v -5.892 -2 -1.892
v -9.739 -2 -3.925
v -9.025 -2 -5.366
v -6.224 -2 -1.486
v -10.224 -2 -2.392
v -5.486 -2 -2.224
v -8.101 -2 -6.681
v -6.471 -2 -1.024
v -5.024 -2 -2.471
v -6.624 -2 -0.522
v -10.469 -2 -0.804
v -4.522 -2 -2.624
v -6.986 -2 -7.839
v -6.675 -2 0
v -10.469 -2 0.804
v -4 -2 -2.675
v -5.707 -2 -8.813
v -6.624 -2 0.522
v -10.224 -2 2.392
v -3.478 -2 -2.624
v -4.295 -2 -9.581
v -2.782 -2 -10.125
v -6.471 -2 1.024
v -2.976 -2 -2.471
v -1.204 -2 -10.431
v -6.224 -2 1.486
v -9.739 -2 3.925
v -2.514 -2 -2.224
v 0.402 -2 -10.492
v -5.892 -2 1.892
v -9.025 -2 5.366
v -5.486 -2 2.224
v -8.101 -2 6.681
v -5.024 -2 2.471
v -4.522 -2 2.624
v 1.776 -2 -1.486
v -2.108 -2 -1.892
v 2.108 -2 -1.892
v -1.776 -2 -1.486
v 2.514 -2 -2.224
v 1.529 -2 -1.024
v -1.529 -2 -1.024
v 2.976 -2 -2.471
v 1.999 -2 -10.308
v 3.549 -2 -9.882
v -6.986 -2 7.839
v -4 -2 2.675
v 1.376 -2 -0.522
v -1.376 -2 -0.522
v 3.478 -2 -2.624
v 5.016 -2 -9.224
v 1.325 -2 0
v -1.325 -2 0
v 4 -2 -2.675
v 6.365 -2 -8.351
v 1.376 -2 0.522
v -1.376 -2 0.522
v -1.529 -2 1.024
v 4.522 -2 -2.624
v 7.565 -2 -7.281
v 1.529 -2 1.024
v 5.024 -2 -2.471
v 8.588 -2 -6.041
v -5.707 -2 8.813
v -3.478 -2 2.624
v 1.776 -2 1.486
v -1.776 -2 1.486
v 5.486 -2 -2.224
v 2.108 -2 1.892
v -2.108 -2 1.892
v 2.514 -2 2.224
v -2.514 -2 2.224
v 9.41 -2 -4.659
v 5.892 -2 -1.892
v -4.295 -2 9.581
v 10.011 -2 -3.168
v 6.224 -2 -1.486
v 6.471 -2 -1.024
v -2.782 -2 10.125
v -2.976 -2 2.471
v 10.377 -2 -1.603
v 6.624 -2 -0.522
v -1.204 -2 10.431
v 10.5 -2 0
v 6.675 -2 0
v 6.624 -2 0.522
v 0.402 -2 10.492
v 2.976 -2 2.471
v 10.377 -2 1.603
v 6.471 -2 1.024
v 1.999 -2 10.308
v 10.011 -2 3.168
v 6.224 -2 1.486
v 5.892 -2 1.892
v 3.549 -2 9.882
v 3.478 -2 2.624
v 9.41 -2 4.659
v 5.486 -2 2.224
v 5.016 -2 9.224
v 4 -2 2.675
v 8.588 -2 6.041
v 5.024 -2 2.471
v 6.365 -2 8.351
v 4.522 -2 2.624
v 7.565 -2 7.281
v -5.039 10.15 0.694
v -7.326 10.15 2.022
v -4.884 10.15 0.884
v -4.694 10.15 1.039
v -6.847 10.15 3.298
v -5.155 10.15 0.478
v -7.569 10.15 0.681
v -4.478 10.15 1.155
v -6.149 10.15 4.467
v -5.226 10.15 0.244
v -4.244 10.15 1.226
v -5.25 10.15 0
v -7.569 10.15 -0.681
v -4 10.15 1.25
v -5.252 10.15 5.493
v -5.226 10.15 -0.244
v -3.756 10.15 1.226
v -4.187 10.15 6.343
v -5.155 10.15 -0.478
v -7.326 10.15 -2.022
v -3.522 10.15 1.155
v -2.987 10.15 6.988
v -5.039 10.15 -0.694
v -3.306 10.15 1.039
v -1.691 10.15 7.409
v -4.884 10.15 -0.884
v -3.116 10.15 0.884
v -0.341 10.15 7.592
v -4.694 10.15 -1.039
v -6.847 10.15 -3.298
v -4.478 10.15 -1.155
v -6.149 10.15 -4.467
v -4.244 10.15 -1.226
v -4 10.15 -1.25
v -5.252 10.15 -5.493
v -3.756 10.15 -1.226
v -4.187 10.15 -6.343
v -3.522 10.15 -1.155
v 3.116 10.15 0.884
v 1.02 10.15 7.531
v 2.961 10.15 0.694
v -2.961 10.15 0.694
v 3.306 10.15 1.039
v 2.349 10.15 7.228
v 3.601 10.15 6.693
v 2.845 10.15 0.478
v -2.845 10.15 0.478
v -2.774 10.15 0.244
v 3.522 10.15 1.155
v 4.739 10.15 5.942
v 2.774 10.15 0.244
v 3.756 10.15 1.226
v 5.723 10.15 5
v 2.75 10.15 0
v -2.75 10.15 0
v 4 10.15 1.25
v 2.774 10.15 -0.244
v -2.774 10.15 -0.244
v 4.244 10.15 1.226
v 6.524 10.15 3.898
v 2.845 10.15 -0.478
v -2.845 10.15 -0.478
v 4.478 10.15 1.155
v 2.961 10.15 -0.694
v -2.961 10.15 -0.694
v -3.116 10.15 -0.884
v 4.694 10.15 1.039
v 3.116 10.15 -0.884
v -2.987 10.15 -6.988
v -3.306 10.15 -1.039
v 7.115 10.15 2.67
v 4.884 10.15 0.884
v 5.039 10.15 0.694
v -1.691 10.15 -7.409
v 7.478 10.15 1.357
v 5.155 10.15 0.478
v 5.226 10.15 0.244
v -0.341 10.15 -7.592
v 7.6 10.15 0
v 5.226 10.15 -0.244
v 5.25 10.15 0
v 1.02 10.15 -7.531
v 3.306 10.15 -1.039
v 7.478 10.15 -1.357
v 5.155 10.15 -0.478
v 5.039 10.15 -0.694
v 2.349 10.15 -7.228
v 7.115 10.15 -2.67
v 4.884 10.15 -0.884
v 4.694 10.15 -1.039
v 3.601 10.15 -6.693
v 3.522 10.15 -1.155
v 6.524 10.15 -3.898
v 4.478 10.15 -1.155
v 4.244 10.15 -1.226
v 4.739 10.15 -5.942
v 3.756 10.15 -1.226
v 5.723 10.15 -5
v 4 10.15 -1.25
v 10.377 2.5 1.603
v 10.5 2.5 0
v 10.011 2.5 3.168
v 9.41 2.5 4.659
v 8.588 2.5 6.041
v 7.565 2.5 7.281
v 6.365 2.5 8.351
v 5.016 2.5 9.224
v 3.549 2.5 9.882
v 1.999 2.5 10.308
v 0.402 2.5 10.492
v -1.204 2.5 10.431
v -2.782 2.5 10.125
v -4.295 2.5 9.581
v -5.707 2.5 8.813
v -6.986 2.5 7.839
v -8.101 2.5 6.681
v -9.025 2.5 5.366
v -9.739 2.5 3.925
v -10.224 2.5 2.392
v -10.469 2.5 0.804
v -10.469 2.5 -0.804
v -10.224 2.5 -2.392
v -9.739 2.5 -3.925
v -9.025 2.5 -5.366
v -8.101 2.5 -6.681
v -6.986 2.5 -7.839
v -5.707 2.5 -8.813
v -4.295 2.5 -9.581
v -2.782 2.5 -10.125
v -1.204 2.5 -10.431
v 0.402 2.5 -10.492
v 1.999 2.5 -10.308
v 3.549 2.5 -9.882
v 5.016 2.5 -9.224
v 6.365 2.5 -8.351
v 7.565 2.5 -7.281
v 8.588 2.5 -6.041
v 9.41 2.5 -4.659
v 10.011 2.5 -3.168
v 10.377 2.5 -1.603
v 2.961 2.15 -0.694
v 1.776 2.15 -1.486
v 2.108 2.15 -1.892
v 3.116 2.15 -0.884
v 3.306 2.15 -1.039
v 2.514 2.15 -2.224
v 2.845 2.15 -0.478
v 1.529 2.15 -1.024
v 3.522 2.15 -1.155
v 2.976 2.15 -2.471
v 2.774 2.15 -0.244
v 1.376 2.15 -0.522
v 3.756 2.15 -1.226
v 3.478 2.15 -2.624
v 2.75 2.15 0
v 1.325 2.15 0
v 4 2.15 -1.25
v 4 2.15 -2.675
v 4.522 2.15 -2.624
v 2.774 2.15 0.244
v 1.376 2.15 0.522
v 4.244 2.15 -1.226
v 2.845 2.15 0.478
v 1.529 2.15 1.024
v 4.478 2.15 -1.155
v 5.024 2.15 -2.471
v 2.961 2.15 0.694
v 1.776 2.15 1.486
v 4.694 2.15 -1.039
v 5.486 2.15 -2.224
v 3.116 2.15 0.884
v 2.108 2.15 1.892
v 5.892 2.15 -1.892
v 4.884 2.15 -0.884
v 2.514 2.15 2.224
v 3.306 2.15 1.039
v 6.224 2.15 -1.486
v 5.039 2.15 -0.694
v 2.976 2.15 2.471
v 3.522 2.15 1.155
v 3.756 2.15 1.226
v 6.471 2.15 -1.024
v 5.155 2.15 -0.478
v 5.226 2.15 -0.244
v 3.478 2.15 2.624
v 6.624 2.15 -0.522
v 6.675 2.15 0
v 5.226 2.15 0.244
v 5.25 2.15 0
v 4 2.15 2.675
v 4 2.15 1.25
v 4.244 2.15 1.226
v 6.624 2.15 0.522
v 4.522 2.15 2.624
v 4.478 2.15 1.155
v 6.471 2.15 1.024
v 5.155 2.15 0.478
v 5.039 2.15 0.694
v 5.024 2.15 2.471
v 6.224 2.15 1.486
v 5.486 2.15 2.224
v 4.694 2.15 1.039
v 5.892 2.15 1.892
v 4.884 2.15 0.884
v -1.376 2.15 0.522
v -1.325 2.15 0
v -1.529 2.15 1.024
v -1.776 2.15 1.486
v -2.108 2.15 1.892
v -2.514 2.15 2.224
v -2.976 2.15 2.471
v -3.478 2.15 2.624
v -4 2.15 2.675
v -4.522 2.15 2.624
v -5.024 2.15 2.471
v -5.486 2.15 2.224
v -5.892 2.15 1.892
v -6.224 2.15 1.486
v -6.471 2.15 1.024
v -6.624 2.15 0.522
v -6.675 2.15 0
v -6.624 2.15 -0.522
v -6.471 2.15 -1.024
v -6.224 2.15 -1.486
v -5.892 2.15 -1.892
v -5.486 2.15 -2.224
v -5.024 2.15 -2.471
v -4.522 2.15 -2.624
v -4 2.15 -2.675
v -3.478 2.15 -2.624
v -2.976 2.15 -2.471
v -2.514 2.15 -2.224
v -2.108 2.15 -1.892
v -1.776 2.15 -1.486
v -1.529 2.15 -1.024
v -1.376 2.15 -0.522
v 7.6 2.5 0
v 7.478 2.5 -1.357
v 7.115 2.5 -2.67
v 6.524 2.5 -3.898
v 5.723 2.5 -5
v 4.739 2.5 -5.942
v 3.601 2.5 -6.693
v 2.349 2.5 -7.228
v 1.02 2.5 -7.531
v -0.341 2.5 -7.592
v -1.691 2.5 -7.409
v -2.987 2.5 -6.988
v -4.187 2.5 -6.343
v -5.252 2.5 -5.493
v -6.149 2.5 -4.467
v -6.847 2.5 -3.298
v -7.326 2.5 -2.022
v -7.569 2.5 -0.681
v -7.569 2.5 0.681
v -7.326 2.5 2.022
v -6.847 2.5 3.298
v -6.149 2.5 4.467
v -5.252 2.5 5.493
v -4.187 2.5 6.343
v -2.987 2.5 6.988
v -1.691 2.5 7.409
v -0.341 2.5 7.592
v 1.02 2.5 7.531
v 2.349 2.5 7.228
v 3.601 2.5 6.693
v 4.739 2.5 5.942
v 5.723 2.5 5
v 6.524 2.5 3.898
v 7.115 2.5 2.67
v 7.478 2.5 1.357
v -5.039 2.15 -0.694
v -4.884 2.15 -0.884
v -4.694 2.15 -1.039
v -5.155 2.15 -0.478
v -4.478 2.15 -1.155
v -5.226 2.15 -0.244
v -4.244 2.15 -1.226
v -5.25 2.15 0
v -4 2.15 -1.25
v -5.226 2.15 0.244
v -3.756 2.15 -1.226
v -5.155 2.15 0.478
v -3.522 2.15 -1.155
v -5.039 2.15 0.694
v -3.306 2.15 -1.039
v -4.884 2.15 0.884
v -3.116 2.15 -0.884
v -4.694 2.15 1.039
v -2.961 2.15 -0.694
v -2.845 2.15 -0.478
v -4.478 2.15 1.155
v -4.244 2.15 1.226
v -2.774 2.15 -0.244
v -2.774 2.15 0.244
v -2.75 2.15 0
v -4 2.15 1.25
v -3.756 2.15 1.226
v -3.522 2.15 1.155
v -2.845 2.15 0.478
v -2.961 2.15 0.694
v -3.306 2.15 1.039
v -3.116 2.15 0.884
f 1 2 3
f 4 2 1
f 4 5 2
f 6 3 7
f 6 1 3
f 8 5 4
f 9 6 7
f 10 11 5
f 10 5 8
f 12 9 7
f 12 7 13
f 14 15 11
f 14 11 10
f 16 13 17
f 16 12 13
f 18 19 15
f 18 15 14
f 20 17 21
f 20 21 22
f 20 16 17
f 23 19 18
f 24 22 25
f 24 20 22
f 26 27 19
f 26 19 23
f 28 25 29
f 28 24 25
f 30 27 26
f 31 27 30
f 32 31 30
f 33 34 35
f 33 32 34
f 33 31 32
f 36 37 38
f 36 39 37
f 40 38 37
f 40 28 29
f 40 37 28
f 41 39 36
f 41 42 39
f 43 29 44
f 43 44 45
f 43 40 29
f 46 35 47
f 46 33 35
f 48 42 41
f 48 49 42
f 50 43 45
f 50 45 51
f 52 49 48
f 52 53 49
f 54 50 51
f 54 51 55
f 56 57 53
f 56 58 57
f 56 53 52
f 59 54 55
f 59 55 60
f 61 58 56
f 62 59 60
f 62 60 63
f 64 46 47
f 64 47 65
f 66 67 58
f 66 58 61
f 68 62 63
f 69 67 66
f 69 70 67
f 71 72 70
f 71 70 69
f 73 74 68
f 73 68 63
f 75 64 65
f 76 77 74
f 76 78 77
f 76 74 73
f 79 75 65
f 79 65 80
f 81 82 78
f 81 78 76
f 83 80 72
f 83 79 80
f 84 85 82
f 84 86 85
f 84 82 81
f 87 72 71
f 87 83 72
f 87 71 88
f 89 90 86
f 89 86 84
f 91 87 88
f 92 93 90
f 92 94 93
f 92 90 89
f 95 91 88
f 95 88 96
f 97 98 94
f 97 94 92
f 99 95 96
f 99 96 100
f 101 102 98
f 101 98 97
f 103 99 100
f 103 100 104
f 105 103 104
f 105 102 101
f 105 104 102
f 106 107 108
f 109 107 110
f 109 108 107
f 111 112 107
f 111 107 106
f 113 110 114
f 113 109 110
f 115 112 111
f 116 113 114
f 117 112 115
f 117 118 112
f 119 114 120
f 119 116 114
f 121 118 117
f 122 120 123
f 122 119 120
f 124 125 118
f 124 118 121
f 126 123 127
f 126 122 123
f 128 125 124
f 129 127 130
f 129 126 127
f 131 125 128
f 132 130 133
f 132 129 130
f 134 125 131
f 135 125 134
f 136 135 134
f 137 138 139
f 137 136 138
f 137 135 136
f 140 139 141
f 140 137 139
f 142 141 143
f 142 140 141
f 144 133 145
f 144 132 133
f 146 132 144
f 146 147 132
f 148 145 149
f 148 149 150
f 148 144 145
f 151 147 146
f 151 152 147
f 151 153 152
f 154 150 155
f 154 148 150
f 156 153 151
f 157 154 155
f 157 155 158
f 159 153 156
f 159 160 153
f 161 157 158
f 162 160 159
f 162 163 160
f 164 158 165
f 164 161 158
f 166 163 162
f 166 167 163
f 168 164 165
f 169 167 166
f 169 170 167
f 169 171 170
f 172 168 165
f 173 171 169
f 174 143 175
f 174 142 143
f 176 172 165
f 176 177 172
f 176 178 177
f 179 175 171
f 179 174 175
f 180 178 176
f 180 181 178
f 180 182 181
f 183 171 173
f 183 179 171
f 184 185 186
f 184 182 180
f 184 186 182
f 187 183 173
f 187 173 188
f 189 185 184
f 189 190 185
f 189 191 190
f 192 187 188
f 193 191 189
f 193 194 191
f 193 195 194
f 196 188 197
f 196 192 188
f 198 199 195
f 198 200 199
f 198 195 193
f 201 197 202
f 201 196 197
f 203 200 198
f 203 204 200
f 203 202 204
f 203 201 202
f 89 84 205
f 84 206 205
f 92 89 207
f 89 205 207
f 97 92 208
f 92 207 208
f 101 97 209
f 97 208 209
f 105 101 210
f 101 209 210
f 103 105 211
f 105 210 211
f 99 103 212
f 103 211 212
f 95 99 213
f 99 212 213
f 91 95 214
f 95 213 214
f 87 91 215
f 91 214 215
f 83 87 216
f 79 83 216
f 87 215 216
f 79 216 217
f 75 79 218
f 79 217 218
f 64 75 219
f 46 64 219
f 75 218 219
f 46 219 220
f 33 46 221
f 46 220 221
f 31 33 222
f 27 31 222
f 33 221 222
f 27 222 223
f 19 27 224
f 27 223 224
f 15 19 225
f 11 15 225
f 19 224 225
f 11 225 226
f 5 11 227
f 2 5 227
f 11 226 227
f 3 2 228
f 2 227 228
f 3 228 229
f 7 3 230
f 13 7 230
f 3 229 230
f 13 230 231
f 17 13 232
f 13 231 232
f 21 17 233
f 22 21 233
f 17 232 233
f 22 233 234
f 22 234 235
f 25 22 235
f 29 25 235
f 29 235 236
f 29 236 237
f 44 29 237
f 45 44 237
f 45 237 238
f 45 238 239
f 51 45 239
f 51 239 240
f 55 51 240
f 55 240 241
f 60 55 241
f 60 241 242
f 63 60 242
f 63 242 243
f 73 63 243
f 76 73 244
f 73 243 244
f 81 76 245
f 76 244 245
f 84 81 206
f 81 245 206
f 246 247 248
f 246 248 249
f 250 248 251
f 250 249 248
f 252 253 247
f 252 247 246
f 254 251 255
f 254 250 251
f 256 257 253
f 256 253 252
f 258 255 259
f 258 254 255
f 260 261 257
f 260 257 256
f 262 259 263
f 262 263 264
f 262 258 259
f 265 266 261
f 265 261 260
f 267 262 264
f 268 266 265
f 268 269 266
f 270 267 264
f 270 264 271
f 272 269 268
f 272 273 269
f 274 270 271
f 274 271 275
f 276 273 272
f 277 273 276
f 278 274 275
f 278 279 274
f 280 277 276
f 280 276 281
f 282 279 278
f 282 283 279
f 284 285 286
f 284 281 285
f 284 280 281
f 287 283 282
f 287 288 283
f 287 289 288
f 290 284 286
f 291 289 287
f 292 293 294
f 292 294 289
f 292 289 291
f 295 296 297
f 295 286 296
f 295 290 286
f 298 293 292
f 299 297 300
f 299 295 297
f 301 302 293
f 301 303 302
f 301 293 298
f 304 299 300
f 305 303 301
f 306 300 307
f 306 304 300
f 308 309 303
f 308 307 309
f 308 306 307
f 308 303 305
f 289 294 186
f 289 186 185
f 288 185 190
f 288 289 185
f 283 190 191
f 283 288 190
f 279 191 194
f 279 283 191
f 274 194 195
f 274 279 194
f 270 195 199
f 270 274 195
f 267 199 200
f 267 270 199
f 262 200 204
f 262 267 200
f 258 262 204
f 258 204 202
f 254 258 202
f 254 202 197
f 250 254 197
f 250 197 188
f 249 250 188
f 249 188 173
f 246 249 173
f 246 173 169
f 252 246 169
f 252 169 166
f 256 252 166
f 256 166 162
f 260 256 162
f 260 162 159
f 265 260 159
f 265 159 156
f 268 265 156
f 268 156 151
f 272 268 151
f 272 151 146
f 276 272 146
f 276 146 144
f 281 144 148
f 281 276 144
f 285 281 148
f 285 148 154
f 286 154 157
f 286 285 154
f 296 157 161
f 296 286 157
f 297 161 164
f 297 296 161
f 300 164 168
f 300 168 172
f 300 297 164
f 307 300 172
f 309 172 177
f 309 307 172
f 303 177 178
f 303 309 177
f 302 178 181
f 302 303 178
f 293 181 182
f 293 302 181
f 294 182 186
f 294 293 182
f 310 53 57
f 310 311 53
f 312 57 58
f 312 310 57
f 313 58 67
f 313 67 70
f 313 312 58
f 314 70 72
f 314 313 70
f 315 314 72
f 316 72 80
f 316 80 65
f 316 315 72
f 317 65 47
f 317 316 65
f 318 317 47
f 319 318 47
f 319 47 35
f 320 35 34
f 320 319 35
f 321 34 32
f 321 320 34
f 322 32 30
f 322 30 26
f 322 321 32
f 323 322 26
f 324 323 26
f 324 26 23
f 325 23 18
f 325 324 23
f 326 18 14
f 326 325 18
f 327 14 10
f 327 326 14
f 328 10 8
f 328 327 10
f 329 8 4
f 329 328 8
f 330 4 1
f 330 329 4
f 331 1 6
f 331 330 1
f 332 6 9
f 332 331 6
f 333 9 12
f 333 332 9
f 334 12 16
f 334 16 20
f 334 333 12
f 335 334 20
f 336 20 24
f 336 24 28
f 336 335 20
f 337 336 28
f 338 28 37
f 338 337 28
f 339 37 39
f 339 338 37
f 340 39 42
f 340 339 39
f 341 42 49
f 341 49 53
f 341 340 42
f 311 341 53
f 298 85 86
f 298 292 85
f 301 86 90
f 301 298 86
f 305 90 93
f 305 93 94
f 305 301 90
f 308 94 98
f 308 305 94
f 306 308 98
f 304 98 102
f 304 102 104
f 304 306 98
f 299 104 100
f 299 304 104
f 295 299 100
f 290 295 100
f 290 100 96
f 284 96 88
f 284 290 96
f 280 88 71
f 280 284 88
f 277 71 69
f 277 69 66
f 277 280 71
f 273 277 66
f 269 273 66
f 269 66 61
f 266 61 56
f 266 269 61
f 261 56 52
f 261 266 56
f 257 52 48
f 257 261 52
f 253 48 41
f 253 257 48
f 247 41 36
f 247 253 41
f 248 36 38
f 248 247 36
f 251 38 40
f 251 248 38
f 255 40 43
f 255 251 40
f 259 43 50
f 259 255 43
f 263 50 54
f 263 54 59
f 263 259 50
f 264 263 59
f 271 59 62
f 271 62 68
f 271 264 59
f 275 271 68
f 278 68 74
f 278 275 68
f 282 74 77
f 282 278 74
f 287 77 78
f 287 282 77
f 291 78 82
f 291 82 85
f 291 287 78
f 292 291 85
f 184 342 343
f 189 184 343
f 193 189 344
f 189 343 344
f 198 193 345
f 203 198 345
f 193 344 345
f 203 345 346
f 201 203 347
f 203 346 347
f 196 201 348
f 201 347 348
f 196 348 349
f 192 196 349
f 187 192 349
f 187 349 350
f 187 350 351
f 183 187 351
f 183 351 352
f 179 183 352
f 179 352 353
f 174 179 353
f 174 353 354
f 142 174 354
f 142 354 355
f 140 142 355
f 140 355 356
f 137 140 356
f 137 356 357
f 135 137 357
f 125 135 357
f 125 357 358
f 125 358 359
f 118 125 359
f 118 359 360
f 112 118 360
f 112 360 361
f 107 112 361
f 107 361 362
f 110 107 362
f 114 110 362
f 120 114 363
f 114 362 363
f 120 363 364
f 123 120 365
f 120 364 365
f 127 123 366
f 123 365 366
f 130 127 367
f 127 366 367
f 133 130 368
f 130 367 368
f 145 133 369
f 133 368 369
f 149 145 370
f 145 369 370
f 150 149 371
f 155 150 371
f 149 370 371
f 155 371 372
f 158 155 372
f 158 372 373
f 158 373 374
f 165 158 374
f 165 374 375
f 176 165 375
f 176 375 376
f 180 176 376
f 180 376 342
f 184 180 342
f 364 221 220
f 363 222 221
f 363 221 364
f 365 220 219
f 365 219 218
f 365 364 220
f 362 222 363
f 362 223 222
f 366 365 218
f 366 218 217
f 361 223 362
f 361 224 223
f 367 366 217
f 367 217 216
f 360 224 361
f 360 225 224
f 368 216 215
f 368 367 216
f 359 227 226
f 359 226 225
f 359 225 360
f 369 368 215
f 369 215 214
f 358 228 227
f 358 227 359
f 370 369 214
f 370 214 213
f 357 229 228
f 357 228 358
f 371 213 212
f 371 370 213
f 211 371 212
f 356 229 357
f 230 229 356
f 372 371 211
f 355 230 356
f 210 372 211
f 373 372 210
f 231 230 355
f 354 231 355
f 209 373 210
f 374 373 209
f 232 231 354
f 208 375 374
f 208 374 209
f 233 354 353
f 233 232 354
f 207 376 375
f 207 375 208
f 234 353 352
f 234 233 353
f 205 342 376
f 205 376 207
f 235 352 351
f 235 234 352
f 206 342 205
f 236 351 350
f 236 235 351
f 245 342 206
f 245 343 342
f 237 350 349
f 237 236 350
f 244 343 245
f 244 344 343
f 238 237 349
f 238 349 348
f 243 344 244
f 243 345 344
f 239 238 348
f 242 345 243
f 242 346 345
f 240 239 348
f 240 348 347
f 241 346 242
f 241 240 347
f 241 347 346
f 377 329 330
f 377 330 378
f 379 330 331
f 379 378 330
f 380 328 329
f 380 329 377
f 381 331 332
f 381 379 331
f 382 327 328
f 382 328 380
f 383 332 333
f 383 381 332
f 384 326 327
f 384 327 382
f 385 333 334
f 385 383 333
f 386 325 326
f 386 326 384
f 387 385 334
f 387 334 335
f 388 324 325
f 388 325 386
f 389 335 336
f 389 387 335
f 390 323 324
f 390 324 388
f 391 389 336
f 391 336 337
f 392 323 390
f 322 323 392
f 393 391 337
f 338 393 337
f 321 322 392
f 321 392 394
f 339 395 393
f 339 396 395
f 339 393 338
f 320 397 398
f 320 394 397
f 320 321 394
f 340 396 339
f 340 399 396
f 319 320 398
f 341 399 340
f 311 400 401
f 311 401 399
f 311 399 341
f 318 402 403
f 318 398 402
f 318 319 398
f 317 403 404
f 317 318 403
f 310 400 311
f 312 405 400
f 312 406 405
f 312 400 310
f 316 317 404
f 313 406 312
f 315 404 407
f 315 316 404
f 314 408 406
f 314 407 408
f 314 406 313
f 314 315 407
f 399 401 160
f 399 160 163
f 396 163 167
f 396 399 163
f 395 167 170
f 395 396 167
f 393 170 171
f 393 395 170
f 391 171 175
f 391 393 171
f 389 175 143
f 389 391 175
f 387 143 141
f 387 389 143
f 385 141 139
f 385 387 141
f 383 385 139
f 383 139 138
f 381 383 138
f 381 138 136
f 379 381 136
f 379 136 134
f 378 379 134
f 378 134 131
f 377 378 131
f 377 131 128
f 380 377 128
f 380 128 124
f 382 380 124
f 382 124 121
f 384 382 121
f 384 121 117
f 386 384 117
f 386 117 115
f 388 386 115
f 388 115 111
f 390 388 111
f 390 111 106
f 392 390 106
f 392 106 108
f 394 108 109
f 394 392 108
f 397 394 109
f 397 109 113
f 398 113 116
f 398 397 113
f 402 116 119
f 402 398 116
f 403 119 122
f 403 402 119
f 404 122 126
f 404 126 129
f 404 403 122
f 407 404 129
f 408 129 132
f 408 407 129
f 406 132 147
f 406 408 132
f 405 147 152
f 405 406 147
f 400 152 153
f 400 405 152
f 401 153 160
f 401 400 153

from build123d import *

# Parameters (mm, degrees)
SKETCH2_R           = 7.6
SKETCH2_R_2         = 1.25
BOSS_EXTRUDE2_DEPTH = 10.15
SKETCH3_R           = 10.5
SKETCH3_R_2         = 1.25
BOSS_EXTRUDE3_DEPTH = 2.5
SKETCH4_R           = 2.675
CUT_EXTRUDE1_DEPTH  = 2.15
SKETCH5_R           = 10.5
SKETCH5_R_2         = 2.675
BOSS_EXTRUDE4_DEPTH = 2


with BuildPart() as part:
    # Sketch2 → Boss-Extrude2 (new body)
    with BuildSketch(Plane(origin=(0, 0, 0), x_dir=(1, 0, 0), z_dir=(0, 1, 0))):
        Circle(SKETCH2_R)
        with Locations((4, 0)):
            Circle(SKETCH2_R_2, mode=Mode.SUBTRACT)
        with Locations((-4, 0)):
            Circle(SKETCH2_R_2, mode=Mode.SUBTRACT)
    extrude(amount=BOSS_EXTRUDE2_DEPTH)

    # Sketch3 → Boss-Extrude3 (add)
    with BuildSketch(Plane(origin=(0, 0, 0), x_dir=(1, 0, 0), z_dir=(0, 1, 0))):
        Circle(SKETCH3_R)
        with Locations((-4, 0)):
            Circle(SKETCH3_R_2, mode=Mode.SUBTRACT)
        with Locations((4, 0)):
            Circle(SKETCH3_R_2, mode=Mode.SUBTRACT)
    extrude(amount=BOSS_EXTRUDE3_DEPTH)

    # Sketch4 → Cut-Extrude1 (cut)
    with BuildSketch(Plane.XZ):
        with Locations((4, 0)):
            Circle(SKETCH4_R)
        with Locations((-4, 0)):
            Circle(SKETCH4_R)
    extrude(amount=-CUT_EXTRUDE1_DEPTH, mode=Mode.SUBTRACT)

    # Sketch5 → Boss-Extrude4 (add)
    with BuildSketch(Plane.XZ):
        Circle(SKETCH5_R)
        with Locations((-4, 0)):
            Circle(SKETCH5_R_2, mode=Mode.SUBTRACT)
        with Locations((4, 0)):
            Circle(SKETCH5_R_2, mode=Mode.SUBTRACT)
    extrude(amount=BOSS_EXTRUDE4_DEPTH)


solid = part.part
